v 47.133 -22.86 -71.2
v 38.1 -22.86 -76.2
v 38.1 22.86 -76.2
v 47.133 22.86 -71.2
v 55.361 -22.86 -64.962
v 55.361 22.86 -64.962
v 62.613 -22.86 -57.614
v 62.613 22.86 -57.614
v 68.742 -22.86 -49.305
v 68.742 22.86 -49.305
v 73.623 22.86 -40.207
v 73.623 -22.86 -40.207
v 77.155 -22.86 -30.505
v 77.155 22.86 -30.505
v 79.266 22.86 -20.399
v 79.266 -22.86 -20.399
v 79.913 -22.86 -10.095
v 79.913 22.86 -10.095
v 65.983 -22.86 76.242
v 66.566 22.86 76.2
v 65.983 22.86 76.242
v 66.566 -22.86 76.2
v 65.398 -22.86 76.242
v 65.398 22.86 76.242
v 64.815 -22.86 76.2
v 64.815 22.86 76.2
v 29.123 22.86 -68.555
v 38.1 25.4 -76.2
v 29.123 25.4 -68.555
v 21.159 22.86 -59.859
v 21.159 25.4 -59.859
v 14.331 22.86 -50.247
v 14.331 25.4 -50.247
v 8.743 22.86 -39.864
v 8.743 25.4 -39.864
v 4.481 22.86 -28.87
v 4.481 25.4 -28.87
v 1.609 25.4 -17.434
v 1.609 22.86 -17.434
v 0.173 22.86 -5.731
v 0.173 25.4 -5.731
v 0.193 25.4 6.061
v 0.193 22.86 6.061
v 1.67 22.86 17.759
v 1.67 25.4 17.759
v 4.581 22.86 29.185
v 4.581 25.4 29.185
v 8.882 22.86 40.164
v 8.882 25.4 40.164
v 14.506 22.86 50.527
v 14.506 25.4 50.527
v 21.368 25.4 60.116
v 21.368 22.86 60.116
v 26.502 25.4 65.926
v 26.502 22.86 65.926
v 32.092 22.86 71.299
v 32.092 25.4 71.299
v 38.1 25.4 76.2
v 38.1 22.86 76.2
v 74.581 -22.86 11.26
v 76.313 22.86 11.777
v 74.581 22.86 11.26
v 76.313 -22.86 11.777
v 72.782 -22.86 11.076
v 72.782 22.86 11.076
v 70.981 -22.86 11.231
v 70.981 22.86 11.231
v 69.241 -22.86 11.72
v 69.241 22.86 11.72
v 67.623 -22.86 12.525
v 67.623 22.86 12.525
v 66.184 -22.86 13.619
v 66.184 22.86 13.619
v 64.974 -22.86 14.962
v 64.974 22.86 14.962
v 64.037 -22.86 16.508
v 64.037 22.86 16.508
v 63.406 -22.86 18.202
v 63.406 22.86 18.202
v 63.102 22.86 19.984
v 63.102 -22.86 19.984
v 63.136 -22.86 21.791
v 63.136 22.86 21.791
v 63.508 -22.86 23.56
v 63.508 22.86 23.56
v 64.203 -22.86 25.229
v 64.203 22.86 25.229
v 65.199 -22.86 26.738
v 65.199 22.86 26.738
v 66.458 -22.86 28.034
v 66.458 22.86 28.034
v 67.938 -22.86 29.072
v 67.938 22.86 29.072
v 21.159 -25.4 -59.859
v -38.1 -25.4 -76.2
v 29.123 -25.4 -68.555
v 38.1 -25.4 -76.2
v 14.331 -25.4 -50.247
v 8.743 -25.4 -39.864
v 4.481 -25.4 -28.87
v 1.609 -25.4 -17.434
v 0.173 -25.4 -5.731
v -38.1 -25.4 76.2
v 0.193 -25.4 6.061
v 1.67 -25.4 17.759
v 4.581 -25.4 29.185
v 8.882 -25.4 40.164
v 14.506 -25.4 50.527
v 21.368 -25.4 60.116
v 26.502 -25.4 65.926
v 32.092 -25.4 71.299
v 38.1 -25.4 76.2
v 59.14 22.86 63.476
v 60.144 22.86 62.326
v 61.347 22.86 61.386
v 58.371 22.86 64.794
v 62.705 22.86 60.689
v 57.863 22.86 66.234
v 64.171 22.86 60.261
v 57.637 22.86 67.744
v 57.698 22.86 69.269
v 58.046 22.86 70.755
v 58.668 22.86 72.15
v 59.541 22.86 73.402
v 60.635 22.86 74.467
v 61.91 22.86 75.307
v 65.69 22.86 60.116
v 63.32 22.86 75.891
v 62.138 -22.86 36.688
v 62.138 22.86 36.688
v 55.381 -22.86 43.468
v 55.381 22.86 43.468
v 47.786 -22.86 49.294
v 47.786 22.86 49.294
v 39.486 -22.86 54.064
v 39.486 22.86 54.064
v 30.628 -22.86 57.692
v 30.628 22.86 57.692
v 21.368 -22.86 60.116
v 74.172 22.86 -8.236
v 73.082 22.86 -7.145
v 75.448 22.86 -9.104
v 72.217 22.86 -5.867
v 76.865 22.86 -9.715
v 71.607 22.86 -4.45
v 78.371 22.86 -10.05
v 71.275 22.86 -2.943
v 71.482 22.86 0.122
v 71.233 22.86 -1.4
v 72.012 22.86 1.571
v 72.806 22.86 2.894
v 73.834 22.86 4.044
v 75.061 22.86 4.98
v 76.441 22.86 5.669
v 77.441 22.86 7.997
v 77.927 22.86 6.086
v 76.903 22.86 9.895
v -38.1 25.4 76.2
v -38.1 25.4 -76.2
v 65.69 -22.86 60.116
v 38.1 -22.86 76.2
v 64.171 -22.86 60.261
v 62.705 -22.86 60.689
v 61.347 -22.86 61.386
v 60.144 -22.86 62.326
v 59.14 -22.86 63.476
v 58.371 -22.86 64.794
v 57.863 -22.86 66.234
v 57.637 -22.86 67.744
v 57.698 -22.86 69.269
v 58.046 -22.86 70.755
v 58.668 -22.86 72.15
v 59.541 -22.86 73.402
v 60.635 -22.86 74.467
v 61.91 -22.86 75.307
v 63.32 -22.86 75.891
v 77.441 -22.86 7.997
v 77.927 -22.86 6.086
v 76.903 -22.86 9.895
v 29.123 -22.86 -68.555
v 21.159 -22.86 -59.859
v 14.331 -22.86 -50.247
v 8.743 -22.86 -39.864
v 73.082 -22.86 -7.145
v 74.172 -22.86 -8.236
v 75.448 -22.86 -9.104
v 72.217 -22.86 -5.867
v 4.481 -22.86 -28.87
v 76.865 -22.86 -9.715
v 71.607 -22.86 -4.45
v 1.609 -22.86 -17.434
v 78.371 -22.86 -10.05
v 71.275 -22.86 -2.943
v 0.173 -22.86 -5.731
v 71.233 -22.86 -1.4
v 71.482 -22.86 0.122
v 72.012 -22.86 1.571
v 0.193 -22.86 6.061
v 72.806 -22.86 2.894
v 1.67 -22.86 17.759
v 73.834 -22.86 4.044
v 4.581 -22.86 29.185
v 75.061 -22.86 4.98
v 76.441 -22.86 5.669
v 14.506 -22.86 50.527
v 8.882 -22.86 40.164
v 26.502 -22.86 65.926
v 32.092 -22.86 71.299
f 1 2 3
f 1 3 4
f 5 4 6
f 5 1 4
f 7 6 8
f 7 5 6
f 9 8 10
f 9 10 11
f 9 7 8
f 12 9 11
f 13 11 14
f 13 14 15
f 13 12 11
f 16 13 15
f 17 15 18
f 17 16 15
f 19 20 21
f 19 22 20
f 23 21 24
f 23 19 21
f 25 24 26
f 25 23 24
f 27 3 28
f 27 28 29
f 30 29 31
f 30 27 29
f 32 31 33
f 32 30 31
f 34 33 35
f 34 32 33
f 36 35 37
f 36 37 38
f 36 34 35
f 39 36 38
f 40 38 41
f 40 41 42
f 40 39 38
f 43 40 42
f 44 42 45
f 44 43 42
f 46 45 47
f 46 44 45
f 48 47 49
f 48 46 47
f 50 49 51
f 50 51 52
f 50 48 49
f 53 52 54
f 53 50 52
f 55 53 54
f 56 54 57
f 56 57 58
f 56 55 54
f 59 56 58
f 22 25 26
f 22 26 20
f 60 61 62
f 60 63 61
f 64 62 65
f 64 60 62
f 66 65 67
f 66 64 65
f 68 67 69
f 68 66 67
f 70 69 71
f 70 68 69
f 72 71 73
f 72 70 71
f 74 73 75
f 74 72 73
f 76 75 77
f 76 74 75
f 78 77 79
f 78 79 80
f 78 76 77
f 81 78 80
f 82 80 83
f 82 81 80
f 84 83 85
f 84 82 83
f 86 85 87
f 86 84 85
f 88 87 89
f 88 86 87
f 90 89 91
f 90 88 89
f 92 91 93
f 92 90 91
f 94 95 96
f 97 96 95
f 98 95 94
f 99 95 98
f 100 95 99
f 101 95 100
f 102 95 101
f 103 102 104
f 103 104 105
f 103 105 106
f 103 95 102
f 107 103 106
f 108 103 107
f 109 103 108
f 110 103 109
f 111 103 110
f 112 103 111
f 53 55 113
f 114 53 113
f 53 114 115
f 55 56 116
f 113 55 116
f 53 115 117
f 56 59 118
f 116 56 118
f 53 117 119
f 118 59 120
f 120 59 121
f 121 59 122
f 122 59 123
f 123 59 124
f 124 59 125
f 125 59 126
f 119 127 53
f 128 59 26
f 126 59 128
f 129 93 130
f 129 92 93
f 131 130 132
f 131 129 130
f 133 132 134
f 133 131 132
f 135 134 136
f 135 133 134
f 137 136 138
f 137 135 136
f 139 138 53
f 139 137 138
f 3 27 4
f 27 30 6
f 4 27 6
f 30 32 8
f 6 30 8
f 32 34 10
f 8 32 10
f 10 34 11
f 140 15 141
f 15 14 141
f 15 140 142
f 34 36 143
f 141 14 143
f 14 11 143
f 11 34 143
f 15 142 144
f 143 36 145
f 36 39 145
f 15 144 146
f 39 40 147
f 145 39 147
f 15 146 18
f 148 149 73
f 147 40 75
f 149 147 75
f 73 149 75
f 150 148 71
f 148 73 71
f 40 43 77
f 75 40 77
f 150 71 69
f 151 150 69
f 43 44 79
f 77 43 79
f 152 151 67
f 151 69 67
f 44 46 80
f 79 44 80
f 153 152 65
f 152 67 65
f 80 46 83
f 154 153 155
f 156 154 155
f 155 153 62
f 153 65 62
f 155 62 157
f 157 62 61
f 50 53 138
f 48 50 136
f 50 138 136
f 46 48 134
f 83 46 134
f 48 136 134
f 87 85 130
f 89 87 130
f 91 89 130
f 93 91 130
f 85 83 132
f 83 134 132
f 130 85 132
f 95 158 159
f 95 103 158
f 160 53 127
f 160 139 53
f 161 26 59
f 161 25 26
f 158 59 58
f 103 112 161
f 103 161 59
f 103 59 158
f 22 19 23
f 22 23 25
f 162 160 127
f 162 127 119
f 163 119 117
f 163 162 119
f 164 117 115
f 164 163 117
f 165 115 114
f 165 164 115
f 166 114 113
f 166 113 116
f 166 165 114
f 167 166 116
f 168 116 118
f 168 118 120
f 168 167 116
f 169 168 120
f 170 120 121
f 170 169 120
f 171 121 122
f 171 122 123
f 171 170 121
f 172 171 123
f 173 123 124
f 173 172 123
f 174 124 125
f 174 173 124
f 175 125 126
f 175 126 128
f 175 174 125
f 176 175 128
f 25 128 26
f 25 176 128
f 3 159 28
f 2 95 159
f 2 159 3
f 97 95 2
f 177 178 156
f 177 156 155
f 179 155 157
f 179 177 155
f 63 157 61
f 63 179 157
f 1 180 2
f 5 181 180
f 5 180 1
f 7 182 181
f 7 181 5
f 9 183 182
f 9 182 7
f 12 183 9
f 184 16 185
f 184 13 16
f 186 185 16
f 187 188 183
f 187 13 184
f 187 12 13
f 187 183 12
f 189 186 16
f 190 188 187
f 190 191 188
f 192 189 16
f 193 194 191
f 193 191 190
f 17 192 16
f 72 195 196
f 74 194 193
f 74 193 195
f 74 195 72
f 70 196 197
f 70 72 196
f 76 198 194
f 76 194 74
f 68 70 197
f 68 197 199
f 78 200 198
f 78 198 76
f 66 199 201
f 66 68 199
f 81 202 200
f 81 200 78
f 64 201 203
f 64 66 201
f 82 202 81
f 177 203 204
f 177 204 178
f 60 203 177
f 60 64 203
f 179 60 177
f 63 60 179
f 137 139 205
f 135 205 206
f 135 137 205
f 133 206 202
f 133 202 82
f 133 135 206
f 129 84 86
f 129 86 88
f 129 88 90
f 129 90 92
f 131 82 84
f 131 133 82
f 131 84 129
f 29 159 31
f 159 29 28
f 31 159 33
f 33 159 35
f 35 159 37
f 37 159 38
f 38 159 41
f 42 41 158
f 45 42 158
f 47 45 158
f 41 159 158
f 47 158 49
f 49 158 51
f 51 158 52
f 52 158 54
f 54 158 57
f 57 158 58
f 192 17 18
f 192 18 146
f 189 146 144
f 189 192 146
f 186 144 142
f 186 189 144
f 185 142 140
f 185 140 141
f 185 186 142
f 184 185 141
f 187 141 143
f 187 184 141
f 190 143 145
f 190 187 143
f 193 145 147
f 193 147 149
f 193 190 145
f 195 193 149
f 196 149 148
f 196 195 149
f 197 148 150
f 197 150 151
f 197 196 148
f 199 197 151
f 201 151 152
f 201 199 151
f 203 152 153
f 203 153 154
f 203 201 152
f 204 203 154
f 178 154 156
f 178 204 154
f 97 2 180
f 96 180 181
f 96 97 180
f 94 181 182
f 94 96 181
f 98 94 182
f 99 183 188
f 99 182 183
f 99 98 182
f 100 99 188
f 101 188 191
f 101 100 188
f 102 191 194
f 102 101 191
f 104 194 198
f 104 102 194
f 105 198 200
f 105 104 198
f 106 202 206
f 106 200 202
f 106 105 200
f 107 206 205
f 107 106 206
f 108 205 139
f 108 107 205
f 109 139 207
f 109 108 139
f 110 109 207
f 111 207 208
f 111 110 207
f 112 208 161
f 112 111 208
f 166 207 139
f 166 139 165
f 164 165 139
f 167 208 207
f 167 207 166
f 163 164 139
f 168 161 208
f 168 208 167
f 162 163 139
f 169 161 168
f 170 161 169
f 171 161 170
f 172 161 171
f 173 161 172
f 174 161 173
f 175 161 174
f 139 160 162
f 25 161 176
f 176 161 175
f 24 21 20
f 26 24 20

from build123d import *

# Parameters (mm, degrees)
F1_DEPTH = 25.4
F2_DEPTH = 22.86


with BuildPart() as f1:
    # F0 (on Front) → F1 (new body, symmetric)
    with BuildSketch(Plane.XZ):
        with BuildLine():
            Line((-38.1, -76.2), (38.1, -76.2))
            ThreePointArc((38.1, -76.2), (0.709542394, -11.6044980782), (21.3676740894, 60.1162575185))
            ThreePointArc((21.3676740894, 60.1162575185), (29.2421269738, 68.6696672379), (38.1, 76.2))
            Line((38.1, 76.2), (17.5172466843, 76.2))
            Line((17.5172466843, 76.2), (-38.1, 76.2))
            Line((-38.1, 76.2), (-38.1, -76.2))
        make_face()
    extrude(amount=F1_DEPTH, both=True)



with BuildPart() as f2:
    # F0 (on Front) → F2 (new body, symmetric)
    with BuildSketch(Plane.XZ):
        with BuildLine():
            ThreePointArc((66.565518939, 76.2), (65.6902864575, 76.2476277146), (64.8150539761, 76.2))
            Line((64.8150539761, 76.2), (66.565518939, 76.2))
        make_face()
    extrude(amount=F2_DEPTH, both=True)


with BuildPart() as f1_1:
    add(f1.part)

    add(f2.part)  # F2#2 merges F2
    # F0 (on Front) → F2, piece 2 (join, symmetric)
    with BuildSketch(Plane.XZ):
        with BuildLine():
            ThreePointArc((38.1, 76.2), (29.2421269738, 68.6696672379), (21.3676740894, 60.1162575185))
            Line((21.3676740894, 60.1162575185), (65.6902864575, 60.1162575185))
            ThreePointArc((65.6902864575, 60.1162575185), (57.6365170899, 67.7436789129), (64.8150539761, 76.2))
            Line((64.8150539761, 76.2), (38.1, 76.2))
        make_face()
        with BuildLine():
            ThreePointArc((21.3676740894, 60.1162575185), (0.709542394, -11.6044980782), (38.1, -76.2))
            ThreePointArc((38.1, -76.2), (68.7424455832, -49.3054294639), (79.9131497153, -10.0945538702))
            ThreePointArc((79.9131497153, -10.0945538702), (71.275473587, -2.9427861122), (77.9270839804, 6.0856860805))
            ThreePointArc((77.9270839804, 6.0856860805), (77.1783216459, 8.9480305918), (76.3128333068, 11.7772691943))
            ThreePointArc((76.3128333068, 11.7772691943), (64.037134436, 16.508200152), (67.9383126947, 29.0722480144))
            ThreePointArc((67.9383126947, 29.0722480144), (47.785974111, 49.2941905371), (21.3676740894, 60.1162575185))
        make_face()
    extrude(amount=F2_DEPTH, both=True)


solid = f1_1.part
